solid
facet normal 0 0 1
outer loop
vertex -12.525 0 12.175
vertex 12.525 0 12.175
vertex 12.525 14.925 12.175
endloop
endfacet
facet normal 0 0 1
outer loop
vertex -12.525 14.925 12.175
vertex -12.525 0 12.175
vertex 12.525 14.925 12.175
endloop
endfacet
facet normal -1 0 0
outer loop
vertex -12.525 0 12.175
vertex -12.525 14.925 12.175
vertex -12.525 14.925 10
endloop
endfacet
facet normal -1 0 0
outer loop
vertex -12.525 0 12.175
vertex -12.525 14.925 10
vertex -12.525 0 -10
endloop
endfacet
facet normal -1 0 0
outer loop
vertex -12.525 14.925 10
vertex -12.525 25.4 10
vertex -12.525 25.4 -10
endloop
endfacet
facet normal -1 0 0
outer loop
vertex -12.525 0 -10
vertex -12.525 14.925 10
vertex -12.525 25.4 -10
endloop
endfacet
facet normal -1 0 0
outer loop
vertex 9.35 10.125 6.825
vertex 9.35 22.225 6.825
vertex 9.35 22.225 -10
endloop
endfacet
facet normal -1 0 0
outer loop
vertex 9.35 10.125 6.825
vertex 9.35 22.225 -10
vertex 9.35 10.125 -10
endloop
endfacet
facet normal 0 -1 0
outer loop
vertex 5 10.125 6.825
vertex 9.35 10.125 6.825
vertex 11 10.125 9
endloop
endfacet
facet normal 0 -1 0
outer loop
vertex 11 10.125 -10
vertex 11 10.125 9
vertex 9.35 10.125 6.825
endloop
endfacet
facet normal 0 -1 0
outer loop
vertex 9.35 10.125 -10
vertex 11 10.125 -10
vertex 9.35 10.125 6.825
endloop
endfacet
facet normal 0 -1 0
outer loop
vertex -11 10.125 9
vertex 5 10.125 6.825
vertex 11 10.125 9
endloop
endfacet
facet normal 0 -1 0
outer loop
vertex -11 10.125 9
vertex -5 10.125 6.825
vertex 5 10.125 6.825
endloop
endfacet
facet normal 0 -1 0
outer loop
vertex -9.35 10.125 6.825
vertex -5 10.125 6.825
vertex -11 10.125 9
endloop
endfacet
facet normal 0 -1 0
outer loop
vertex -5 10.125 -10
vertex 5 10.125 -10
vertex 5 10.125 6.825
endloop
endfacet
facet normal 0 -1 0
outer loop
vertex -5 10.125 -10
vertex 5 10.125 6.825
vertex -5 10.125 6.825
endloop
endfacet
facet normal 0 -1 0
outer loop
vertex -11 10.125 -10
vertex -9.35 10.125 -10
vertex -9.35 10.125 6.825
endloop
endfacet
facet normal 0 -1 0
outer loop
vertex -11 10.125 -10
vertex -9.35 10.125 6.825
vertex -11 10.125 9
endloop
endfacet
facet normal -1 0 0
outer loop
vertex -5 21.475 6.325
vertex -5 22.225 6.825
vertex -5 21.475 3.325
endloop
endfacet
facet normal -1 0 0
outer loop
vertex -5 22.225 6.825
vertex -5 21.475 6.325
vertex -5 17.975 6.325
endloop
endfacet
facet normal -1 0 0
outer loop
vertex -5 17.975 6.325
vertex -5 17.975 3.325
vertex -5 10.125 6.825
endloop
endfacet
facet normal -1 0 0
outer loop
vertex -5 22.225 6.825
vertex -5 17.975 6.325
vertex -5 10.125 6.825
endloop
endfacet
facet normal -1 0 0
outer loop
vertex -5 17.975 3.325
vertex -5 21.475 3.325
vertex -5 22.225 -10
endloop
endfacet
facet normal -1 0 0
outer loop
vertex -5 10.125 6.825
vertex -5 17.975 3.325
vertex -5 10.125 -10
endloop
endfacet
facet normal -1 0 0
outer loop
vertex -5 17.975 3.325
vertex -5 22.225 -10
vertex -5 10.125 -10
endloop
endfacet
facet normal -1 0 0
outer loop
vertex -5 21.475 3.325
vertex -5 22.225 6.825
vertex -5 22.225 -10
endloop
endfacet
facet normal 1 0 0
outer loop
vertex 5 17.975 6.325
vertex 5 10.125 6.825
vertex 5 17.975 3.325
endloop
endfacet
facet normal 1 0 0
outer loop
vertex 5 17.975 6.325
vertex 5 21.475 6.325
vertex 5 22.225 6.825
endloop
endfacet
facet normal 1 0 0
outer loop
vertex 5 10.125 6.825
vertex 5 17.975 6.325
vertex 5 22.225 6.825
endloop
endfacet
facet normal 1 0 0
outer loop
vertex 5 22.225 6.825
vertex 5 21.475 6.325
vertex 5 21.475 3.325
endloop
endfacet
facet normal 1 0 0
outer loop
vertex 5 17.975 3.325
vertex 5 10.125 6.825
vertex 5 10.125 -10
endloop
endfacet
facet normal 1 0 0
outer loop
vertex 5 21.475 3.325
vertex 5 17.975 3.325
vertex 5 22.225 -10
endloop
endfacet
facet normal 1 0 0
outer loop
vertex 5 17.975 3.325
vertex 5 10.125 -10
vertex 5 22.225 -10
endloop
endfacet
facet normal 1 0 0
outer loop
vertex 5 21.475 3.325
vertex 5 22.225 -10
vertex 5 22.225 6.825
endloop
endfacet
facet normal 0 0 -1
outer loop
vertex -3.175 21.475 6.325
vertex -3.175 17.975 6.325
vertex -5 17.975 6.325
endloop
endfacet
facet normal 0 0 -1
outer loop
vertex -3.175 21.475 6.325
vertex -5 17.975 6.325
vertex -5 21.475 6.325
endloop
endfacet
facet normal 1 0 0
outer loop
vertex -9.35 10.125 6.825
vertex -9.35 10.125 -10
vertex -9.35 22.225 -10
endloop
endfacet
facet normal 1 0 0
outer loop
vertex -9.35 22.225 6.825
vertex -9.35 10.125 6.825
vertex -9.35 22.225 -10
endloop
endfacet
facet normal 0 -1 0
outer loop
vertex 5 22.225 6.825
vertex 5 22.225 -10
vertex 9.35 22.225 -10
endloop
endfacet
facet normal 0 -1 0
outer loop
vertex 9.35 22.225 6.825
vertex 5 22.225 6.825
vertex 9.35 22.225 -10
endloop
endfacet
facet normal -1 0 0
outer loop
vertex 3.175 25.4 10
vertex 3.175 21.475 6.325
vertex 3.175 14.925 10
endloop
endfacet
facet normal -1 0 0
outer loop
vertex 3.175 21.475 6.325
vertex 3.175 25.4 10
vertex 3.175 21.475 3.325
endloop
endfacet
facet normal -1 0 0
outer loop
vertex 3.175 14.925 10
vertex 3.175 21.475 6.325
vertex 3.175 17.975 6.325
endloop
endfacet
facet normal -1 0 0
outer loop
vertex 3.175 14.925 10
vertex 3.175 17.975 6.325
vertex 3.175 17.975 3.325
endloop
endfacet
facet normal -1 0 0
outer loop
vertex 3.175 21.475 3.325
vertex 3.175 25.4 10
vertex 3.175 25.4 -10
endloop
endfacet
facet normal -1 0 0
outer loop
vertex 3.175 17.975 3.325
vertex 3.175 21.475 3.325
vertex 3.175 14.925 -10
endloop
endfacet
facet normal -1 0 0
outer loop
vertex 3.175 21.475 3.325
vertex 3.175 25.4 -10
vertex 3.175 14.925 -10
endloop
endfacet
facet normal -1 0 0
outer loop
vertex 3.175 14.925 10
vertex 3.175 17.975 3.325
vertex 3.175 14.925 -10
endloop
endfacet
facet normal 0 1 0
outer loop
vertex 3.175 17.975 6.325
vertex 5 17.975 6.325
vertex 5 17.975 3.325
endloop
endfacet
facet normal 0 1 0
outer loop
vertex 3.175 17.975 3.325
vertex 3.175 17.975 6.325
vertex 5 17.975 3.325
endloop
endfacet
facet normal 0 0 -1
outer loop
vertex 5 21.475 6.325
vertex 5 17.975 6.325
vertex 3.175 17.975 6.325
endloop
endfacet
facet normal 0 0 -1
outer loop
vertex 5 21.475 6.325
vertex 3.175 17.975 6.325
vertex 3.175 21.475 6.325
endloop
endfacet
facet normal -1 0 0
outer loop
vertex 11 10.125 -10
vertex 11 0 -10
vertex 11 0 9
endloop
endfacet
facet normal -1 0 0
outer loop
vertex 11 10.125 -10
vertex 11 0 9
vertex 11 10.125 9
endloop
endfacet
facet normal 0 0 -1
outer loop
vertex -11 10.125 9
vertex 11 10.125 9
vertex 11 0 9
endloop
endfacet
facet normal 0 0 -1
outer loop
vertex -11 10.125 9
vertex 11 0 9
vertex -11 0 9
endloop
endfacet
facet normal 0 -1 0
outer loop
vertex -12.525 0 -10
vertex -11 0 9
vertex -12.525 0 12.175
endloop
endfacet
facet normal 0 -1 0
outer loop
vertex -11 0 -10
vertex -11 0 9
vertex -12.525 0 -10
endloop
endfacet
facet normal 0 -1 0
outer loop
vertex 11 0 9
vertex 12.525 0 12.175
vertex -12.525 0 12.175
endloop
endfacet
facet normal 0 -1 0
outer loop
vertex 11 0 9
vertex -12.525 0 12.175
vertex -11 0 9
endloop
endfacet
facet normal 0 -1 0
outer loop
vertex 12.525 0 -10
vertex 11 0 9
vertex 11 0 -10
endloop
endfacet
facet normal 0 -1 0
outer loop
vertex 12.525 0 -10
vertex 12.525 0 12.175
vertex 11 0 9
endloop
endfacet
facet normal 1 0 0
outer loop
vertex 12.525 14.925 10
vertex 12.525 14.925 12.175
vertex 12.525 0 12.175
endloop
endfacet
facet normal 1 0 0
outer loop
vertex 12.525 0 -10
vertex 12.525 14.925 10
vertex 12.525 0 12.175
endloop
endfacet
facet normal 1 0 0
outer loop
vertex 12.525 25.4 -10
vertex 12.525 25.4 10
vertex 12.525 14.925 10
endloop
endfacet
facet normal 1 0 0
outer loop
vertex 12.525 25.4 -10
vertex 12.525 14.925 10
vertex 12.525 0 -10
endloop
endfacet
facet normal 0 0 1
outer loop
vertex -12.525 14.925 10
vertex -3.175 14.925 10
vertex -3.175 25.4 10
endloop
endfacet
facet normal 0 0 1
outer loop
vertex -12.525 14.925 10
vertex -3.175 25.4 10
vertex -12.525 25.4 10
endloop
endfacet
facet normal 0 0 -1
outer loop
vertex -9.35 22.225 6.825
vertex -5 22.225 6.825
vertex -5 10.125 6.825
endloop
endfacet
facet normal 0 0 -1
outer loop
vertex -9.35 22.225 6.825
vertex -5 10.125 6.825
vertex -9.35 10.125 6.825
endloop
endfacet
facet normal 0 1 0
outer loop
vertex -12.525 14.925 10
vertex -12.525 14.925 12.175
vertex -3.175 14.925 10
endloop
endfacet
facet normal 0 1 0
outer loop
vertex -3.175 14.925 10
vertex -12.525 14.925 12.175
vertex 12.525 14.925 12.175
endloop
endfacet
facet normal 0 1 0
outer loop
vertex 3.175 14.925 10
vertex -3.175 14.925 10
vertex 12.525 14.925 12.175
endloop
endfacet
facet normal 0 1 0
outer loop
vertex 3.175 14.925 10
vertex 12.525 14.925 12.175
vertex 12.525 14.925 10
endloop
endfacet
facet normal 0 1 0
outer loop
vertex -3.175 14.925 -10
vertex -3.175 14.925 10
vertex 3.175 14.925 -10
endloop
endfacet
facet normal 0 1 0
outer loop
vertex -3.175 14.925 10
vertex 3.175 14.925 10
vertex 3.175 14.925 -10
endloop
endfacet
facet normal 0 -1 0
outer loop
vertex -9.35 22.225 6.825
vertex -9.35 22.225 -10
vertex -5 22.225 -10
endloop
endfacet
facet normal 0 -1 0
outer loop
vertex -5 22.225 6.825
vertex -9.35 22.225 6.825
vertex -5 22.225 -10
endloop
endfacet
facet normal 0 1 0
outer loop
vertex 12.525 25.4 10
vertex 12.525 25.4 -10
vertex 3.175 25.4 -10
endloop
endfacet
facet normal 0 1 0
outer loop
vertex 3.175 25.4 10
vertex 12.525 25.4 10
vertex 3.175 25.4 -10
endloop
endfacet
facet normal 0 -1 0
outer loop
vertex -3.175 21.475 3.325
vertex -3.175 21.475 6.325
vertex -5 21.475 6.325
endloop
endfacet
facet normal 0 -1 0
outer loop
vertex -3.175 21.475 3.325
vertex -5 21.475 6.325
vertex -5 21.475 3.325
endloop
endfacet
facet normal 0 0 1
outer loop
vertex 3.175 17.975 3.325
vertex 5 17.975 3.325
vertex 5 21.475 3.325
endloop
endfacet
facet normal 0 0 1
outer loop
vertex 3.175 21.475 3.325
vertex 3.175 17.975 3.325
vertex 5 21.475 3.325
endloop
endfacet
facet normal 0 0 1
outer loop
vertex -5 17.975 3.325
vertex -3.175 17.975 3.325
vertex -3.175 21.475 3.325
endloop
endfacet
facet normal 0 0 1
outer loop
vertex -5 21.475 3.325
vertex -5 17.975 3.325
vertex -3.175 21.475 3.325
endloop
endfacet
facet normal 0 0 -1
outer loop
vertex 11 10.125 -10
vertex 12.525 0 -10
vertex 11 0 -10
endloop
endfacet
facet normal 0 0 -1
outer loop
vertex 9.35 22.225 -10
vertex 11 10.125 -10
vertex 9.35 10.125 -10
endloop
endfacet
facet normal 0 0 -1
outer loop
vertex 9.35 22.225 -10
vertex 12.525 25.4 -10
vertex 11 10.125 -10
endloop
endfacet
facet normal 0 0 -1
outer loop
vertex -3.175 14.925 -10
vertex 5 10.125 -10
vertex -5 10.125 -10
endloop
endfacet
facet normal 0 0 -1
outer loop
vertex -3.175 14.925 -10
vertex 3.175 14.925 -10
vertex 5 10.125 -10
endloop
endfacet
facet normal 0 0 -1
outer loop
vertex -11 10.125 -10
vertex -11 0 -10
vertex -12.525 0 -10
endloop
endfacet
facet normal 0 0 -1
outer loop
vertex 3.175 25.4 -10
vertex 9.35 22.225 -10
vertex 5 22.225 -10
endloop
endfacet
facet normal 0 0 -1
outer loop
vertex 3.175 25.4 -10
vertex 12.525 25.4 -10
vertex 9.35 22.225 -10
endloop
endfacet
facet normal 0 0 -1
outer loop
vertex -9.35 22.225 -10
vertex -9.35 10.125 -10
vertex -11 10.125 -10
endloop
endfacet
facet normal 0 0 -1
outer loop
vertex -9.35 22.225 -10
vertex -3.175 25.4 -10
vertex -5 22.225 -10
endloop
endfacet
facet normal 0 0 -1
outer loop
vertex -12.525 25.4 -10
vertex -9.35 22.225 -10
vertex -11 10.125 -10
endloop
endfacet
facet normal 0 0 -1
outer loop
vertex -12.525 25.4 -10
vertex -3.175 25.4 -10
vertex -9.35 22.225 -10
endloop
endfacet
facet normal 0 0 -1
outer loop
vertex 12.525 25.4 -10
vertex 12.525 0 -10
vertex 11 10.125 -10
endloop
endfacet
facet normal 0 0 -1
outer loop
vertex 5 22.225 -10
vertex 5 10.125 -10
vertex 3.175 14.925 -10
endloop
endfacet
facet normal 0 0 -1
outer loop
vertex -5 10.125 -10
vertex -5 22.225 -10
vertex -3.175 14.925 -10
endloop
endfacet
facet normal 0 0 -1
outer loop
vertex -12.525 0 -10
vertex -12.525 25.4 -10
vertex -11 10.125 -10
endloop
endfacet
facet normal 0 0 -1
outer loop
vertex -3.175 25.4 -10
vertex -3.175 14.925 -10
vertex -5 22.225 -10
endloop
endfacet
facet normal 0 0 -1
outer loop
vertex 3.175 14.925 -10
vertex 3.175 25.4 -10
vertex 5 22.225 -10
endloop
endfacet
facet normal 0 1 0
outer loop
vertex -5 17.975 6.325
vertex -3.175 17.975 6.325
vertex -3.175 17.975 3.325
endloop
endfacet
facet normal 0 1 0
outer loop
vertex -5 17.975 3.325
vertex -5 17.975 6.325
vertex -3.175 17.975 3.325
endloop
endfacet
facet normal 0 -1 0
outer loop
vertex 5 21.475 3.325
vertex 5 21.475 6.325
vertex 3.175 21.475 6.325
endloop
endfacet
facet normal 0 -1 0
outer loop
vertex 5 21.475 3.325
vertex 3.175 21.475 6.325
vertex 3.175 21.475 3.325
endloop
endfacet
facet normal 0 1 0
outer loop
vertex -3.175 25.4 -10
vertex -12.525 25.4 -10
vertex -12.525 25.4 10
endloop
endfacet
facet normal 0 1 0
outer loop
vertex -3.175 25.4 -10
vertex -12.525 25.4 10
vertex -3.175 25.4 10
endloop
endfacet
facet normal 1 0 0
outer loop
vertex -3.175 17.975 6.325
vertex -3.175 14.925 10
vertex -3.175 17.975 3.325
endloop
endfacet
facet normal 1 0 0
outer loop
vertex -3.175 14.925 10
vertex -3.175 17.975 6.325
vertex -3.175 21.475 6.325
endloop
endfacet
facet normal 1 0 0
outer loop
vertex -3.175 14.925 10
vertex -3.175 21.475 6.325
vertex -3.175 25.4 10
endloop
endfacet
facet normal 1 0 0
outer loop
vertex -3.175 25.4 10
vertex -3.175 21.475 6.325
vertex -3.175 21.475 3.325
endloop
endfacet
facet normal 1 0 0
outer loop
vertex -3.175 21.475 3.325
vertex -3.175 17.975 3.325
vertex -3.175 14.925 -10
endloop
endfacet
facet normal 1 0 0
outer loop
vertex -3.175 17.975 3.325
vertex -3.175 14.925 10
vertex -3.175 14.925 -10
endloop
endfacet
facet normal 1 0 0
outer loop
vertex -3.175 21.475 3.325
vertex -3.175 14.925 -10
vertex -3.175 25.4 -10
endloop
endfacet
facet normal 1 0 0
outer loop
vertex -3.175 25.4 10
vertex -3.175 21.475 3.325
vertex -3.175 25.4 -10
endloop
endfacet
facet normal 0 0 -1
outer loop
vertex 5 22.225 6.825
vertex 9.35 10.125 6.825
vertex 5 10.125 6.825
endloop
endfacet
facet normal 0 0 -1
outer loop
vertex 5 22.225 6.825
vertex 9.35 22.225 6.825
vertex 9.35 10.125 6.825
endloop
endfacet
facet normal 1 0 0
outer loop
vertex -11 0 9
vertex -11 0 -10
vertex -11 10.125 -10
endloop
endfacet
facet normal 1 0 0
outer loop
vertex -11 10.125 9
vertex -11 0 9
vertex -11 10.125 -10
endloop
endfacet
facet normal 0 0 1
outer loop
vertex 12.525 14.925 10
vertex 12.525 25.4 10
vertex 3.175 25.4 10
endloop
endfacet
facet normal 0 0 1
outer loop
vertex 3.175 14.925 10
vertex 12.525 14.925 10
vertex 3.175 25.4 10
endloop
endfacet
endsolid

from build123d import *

# Parameters (mm, degrees)
SKETCH2_W           = 18.7
SKETCH2_H           = 20
BOSS_EXTRUDE1_DEPTH = 25.4
SKETCH3_W           = 6.35
SKETCH3_H           = 7.3
SKETCH3_H_2         = 3.175
CUT_EXTRUDE1_DEPTH  = 21
SKETCH5_W           = 3.175
SKETCH5_H           = 25.4
BOSS_EXTRUDE2_DEPTH = 20
SKETCH6_W           = 10
SKETCH6_H           = 10.125
CUT_EXTRUDE2_DEPTH  = 16.825
SKETCH7_W           = 3
SKETCH7_H           = 3.5
CUT_EXTRUDE3_DEPTH  = 10
SKETCH8_W           = 22
SKETCH8_H           = 10.125
CUT_EXTRUDE4_DEPTH  = 19
SKETCH9_W           = 2.175
SKETCH9_H           = 14.925
BOSS_EXTRUDE3_DEPTH = 25.05


with BuildPart() as part:
    # Sketch2 → Boss-Extrude1 (new body)
    with BuildSketch(Plane(origin=(0, 0, 0), x_dir=(1, 0, 0), z_dir=(0, 1, 0))):
        Rectangle(SKETCH2_W, SKETCH2_H)
    extrude(amount=BOSS_EXTRUDE1_DEPTH)

    # Sketch3 → Cut-Extrude1 (cut, through all)
    with BuildSketch(Plane(origin=(0, 0, -10), x_dir=(-1, 0, 0), z_dir=(0, 0, -1))):
        with Locations((0, 21.75)):
            Rectangle(SKETCH3_W, SKETCH3_H)
        with Locations((0, 16.5125)):
            Rectangle(SKETCH3_W, SKETCH3_H_2)
    extrude(amount=-CUT_EXTRUDE1_DEPTH, mode=Mode.SUBTRACT)

    # Sketch5 → Boss-Extrude2 (add)
    with BuildSketch(Plane(origin=(0, 0, -10), x_dir=(-1, 0, 0), z_dir=(0, 0, -1))):
        with Locations((-10.9375, 12.7)):
            Rectangle(SKETCH5_W, SKETCH5_H)
        with Locations((10.9375, 12.7)):
            Rectangle(SKETCH5_W, SKETCH5_H)
    extrude(amount=-BOSS_EXTRUDE2_DEPTH)

    # Sketch6 → Cut-Extrude2 (cut)
    with BuildSketch(Plane(origin=(0, 0, -10), x_dir=(-1, 0, 0), z_dir=(0, 0, -1))):
        Polygon((5, 22.225), (5, 10.125), (5, 0), (9.35, 0), (9.35, 22.225), align=None)
        with Locations((0, 5.0625)):
            Rectangle(SKETCH6_W, SKETCH6_H)
        Polygon((-5, 22.225), (-9.35, 22.225), (-9.35, 0), (-5, 0), (-5, 10.125), align=None)
    extrude(amount=-CUT_EXTRUDE2_DEPTH, mode=Mode.SUBTRACT)

    # Sketch7 → Cut-Extrude3 (cut)
    with BuildSketch(Plane(origin=(5, 0, 0), x_dir=(0, 0, -1), z_dir=(1, 0, 0))):
        with Locations((-4.825, 19.725)):
            Rectangle(SKETCH7_W, SKETCH7_H)
    extrude(amount=-CUT_EXTRUDE3_DEPTH, mode=Mode.SUBTRACT)

    # Sketch8 → Cut-Extrude4 (cut)
    with BuildSketch(Plane(origin=(0, 0, -10), x_dir=(-1, 0, 0), z_dir=(0, 0, -1))):
        with Locations((0, 5.0625)):
            Rectangle(SKETCH8_W, SKETCH8_H)
    extrude(amount=-CUT_EXTRUDE4_DEPTH, mode=Mode.SUBTRACT)

    # Sketch9 → Boss-Extrude3 (add)
    with BuildSketch(Plane(origin=(12.525, 0, 0), x_dir=(0, 0, -1), z_dir=(1, 0, 0))):
        with Locations((-11.0875, 7.4625)):
            Rectangle(SKETCH9_W, SKETCH9_H)
    extrude(amount=-BOSS_EXTRUDE3_DEPTH)


solid = part.part
